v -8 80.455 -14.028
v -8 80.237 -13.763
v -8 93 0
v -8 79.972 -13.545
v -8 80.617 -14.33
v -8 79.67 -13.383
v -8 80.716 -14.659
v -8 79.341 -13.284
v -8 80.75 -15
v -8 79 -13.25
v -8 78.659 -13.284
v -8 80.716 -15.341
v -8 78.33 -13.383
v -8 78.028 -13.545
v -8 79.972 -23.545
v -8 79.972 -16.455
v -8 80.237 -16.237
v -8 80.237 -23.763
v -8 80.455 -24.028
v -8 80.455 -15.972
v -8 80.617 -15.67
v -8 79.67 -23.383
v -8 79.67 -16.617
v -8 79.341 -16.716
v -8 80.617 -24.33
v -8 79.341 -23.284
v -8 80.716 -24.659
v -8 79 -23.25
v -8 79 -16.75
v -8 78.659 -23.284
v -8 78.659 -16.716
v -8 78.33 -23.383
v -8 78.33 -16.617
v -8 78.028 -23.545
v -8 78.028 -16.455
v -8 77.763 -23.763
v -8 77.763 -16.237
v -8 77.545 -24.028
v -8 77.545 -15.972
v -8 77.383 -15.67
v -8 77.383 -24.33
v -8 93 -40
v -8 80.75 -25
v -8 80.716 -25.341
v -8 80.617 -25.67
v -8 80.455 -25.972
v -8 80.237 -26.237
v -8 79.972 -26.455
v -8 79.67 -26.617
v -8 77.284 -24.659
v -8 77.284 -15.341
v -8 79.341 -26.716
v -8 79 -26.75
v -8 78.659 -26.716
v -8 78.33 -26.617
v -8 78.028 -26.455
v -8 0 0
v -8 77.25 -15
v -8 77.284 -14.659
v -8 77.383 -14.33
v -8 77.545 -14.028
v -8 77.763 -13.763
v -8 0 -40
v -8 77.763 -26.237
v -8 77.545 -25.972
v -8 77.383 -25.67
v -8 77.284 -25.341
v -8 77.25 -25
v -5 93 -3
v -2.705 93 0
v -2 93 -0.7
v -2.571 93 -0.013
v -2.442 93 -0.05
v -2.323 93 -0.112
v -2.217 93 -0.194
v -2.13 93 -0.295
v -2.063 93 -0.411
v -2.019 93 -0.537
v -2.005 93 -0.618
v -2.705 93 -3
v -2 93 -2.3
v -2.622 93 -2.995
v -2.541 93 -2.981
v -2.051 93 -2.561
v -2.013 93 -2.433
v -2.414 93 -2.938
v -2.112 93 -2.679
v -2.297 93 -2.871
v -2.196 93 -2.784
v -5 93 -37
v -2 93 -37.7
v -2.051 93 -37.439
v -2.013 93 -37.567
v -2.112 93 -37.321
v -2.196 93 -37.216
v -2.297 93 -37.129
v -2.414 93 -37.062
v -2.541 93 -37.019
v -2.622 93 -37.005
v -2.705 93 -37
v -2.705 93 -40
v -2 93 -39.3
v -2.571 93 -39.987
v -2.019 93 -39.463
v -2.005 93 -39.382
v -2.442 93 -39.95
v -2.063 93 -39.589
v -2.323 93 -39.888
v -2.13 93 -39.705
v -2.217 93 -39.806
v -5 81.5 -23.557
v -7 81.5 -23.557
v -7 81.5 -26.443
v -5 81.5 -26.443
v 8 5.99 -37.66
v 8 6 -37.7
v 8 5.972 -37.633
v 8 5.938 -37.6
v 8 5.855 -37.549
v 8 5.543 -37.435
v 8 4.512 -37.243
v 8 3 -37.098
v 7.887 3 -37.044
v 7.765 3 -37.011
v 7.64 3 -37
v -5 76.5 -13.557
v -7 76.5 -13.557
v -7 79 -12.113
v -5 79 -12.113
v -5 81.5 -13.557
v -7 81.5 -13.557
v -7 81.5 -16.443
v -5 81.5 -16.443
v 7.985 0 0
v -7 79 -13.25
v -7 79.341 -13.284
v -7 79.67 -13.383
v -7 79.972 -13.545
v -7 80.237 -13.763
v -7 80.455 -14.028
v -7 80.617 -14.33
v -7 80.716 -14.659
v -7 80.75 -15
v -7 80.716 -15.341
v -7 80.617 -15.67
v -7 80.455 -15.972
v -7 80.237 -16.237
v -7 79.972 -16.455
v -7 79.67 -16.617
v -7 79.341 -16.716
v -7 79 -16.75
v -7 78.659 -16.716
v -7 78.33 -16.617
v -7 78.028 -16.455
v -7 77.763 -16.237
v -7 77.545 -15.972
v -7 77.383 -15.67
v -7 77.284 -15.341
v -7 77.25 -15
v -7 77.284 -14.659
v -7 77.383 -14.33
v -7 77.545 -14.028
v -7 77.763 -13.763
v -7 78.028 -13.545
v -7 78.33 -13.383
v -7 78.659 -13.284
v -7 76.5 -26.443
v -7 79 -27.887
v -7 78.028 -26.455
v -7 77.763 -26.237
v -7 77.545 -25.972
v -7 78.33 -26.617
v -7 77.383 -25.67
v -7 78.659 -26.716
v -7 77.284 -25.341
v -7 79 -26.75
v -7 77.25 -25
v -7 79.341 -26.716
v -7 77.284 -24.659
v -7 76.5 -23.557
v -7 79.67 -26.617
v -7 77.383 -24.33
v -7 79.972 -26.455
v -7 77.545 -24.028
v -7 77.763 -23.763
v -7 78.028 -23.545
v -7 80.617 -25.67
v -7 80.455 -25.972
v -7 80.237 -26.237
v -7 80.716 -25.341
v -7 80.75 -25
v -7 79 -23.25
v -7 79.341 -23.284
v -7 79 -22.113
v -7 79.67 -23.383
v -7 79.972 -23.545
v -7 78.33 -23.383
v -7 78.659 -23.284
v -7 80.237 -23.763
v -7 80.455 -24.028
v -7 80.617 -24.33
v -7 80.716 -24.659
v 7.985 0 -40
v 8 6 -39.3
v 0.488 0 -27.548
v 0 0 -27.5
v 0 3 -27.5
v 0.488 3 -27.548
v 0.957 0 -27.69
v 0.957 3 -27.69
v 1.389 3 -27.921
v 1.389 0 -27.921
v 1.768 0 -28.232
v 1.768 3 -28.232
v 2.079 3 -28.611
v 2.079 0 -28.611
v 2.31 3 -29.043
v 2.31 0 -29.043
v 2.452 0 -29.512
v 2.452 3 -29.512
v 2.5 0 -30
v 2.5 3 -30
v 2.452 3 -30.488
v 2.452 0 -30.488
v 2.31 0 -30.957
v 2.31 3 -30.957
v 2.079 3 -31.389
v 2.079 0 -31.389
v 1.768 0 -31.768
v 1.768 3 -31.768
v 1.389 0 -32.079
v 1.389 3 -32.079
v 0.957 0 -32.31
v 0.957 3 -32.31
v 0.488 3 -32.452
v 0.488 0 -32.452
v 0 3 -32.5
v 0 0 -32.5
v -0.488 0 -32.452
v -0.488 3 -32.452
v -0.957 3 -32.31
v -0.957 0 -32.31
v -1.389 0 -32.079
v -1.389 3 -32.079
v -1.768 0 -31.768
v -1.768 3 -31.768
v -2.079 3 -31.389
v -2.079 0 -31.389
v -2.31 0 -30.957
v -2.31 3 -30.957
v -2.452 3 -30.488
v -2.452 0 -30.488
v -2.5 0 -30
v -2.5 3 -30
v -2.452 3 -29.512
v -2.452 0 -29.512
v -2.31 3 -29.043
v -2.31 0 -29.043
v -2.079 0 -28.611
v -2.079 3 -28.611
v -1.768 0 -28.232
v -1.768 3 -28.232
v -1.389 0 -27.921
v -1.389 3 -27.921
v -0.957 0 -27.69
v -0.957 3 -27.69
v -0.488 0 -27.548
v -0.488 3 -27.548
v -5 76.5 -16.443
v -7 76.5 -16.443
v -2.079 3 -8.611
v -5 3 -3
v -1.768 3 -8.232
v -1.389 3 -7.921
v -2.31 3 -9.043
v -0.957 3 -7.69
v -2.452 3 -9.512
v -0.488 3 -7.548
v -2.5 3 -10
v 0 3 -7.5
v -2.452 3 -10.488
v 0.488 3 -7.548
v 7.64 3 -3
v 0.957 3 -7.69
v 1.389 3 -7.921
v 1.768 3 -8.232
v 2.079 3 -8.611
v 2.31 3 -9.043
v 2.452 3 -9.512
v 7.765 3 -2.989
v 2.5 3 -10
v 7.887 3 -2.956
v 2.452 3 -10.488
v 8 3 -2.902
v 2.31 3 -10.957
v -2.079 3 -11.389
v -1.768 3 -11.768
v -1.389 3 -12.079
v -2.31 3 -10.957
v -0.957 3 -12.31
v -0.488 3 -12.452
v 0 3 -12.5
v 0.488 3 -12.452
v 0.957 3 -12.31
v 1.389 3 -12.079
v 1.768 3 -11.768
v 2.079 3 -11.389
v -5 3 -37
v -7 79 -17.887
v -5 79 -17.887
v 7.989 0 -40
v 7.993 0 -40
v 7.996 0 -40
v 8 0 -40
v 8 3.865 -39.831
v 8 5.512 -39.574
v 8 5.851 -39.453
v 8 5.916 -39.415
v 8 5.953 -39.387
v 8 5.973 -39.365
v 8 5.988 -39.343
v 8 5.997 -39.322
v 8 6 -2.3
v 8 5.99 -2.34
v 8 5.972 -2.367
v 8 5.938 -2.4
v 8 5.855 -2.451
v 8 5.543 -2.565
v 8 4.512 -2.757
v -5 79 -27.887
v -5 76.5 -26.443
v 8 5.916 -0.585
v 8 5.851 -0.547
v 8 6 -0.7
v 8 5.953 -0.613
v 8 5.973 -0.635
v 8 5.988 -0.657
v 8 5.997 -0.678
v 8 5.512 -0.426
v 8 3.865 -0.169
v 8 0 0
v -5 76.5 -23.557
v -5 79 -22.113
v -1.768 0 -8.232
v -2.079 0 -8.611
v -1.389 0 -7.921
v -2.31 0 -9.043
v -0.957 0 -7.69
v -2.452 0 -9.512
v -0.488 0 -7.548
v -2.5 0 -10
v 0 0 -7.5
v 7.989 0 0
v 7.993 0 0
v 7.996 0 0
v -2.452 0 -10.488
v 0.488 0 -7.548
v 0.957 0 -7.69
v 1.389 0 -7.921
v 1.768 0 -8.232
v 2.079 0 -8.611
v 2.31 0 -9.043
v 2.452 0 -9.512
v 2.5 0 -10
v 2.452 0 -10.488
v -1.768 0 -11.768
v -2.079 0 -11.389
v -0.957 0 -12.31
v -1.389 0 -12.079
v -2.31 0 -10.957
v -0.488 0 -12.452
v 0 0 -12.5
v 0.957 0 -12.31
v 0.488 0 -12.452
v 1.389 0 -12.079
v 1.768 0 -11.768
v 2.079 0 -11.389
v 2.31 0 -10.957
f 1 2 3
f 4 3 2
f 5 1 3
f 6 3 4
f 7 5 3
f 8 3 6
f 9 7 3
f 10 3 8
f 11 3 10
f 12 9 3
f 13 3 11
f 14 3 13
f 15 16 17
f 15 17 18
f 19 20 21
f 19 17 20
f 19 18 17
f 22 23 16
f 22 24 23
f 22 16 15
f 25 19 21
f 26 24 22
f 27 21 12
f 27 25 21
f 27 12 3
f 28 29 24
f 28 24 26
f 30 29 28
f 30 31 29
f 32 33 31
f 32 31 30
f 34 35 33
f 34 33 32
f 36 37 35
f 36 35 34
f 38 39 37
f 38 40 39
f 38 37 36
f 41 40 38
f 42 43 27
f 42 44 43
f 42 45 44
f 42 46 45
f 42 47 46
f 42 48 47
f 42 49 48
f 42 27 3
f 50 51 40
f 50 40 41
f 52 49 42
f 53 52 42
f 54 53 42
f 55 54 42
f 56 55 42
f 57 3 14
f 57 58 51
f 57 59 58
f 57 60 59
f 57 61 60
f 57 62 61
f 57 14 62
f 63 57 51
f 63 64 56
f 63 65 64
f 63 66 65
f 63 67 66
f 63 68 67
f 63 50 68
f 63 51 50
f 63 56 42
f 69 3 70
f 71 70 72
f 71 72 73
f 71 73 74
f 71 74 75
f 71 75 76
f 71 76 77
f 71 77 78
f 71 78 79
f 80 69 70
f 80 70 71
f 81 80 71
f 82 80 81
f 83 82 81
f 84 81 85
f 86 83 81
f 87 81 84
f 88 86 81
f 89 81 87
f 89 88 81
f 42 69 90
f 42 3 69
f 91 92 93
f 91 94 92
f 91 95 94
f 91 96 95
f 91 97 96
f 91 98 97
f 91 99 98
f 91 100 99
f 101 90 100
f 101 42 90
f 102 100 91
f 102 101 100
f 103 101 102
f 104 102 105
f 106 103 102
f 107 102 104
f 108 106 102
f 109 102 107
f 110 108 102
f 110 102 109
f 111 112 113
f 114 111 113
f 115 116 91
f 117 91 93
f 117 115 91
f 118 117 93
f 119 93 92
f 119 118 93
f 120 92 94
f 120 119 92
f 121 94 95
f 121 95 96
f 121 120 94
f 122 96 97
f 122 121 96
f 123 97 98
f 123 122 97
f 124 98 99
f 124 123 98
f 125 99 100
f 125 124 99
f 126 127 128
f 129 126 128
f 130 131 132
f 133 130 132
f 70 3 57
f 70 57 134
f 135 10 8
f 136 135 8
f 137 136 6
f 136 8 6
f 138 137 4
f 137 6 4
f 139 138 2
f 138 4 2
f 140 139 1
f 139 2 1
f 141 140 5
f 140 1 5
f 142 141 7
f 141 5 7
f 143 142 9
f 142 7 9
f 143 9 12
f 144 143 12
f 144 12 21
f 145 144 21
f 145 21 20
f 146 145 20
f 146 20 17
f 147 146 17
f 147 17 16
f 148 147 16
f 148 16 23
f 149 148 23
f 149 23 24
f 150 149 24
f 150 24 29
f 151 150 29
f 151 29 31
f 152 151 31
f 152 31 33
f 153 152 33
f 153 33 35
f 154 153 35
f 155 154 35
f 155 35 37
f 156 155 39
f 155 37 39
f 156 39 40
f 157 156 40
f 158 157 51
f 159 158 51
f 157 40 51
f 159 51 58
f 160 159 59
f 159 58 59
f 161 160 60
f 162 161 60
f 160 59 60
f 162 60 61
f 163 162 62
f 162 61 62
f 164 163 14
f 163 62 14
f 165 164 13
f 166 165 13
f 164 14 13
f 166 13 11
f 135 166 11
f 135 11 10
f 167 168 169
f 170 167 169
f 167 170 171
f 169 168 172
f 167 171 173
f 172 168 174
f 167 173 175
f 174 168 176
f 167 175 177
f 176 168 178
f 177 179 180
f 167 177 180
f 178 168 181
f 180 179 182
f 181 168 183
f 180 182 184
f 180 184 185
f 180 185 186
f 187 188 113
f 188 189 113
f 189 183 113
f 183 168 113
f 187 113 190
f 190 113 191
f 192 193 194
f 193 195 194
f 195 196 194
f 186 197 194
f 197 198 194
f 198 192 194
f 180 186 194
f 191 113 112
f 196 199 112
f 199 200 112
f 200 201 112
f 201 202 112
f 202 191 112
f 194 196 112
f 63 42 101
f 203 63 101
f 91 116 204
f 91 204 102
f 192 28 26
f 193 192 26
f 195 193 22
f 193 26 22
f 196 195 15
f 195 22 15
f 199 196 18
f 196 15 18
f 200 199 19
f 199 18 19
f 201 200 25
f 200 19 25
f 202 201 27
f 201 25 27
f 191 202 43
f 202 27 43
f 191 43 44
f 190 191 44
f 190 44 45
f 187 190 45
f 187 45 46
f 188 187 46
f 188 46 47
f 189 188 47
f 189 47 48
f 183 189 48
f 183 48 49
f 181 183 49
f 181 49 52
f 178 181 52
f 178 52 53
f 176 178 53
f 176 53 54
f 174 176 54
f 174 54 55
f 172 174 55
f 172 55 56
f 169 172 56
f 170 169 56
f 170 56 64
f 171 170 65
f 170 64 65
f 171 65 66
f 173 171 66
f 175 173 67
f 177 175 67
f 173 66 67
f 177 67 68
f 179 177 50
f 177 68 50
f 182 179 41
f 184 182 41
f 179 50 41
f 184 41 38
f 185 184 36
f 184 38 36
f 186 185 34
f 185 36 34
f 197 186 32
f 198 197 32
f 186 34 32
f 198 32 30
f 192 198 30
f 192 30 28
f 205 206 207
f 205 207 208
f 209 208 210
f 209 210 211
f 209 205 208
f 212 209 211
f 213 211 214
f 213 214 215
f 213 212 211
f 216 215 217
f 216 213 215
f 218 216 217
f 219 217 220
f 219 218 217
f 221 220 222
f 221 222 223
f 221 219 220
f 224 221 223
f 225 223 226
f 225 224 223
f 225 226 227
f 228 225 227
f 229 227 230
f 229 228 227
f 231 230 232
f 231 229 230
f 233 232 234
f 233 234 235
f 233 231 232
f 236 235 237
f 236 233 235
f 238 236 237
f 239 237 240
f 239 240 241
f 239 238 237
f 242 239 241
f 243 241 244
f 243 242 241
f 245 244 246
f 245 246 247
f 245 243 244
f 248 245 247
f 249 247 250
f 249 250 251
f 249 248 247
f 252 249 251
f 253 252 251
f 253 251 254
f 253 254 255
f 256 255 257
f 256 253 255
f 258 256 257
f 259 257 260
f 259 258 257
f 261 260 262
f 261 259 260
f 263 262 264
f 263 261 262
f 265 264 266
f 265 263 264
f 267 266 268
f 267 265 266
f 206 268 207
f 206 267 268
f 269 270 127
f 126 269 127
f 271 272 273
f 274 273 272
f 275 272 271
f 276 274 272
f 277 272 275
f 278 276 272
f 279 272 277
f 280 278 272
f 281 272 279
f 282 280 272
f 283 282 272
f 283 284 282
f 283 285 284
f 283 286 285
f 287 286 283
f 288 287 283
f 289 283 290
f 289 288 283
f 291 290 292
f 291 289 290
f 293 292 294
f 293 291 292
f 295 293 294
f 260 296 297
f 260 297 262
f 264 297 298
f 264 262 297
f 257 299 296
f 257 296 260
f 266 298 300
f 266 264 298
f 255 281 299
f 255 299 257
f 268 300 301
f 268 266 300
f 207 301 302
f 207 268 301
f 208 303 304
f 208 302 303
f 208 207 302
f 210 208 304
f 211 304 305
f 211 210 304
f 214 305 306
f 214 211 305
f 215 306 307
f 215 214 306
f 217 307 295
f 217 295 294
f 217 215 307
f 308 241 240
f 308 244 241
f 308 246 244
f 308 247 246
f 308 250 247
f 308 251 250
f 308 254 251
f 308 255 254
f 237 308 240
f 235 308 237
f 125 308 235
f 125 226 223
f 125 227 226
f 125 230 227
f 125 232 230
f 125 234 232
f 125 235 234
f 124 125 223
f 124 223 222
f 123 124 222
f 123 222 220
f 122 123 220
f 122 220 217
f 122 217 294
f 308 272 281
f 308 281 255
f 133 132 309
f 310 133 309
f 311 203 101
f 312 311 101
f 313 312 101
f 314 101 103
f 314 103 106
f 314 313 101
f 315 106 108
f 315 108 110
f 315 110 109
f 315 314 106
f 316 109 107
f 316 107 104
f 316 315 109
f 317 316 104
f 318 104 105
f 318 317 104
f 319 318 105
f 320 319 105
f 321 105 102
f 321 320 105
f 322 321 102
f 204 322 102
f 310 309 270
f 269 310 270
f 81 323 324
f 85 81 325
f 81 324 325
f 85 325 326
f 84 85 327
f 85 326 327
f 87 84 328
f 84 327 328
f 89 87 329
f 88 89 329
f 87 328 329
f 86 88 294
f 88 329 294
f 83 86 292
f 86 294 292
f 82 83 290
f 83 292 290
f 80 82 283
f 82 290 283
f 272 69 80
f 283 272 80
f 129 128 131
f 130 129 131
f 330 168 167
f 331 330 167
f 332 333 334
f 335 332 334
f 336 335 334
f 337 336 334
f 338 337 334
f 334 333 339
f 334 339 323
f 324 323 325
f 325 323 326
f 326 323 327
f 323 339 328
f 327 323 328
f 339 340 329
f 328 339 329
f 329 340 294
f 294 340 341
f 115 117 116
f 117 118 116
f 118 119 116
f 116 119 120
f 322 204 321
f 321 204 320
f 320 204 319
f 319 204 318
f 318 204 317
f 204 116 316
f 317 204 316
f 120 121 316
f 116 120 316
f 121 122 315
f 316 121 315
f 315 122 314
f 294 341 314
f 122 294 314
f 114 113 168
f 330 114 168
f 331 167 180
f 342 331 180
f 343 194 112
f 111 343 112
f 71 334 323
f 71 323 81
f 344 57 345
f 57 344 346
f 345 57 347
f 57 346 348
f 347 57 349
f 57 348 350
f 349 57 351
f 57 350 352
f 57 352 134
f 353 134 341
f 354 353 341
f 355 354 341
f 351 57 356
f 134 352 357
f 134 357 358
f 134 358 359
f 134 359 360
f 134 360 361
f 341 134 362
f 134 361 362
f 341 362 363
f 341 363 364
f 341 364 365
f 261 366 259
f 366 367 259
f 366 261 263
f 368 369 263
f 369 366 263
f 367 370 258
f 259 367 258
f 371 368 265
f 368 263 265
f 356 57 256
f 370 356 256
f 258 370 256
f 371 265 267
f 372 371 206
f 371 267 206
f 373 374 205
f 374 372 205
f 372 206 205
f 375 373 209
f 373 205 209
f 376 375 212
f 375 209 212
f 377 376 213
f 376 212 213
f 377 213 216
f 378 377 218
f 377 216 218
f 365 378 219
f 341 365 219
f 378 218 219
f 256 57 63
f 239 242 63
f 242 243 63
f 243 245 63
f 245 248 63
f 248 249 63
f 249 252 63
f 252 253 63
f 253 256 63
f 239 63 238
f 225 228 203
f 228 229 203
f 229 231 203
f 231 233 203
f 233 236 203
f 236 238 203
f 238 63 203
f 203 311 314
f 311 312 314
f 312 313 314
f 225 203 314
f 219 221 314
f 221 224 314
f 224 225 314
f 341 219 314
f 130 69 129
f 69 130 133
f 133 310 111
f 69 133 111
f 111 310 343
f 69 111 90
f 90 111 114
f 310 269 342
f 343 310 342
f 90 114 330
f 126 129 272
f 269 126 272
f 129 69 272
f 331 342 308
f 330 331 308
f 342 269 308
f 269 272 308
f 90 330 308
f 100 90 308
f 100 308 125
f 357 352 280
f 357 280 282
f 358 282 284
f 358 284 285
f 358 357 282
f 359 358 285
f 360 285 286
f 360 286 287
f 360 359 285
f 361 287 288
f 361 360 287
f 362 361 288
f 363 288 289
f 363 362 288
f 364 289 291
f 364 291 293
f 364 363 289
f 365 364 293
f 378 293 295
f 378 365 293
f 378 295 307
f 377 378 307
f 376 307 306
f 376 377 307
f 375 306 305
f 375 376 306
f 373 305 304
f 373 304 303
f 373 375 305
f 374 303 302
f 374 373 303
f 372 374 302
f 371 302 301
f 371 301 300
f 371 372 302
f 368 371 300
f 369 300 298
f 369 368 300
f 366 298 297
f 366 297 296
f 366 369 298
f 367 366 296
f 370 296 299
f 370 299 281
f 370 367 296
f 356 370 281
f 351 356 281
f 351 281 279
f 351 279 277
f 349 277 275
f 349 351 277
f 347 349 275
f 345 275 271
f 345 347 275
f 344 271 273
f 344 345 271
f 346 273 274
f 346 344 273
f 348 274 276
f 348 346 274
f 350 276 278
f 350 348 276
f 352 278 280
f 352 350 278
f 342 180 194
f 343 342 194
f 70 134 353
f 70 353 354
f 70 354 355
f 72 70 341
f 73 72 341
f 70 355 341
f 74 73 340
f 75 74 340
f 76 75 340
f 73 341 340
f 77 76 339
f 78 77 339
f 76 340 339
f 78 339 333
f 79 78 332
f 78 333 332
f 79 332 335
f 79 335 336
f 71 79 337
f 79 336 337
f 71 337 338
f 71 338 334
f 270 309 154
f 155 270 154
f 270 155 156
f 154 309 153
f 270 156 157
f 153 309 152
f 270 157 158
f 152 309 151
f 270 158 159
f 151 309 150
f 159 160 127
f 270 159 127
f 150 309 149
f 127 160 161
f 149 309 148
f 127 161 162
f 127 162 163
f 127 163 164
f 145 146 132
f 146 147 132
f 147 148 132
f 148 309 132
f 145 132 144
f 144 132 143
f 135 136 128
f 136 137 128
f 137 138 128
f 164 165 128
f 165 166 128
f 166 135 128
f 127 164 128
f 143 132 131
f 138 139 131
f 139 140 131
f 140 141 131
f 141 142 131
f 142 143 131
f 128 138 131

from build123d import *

# Parameters (mm, degrees)
SKETCH1_W               = 16
SKETCH1_H               = 40
SKETCH1_R               = 2.5
BOSS_EXTRUDE1_DEPTH     = 3
BOSS_EXTRUDE3_START     = -3
SKETCH2_W               = 13
SKETCH2_H               = 3
SKETCH2_W_2             = 3
SKETCH2_H_2             = 34
BOSS_EXTRUDE3_DEPTH     = 93
CUT_EXTRUDE1_DEPTH      = 102.552941858
CUT_EXTRUDE1_DEPTH_BACK = 102.552941858
CUT_EXTRUDE2_START      = -1
SKETCH4_R               = 1.75
CUT_EXTRUDE2_DEPTH      = 102.493902258
SKETCH4_AGAIN_R         = 1.75
CUT_EXTRUDE3_DEPTH      = 103.493902258
FILLET1_R               = 0.7


with BuildPart() as part:
    # Sketch1 → Boss-Extrude1 (new body)
    with BuildSketch(Plane(origin=(0, 0, 0), x_dir=(1, 0, 0), z_dir=(0, 1, 0))):
        with Locations((0, 20)):
            Rectangle(SKETCH1_W, SKETCH1_H)
        with Locations(Location((0, 30, 0), (0, 0, 270))):
            Circle(SKETCH1_R, mode=Mode.SUBTRACT)
        with Locations(Location((0, 10, 0), (0, 0, 270))):
            Circle(SKETCH1_R, mode=Mode.SUBTRACT)
    extrude(amount=BOSS_EXTRUDE1_DEPTH)

    # Sketch2 → Boss-Extrude3 (add)
    with BuildSketch(Plane(origin=(0, 3, 0), x_dir=(1, 0, 0), z_dir=(0, 1, 0)).offset(BOSS_EXTRUDE3_START)):
        with Locations((1.5, 38.5)):
            Rectangle(SKETCH2_W, SKETCH2_H)
        with Locations((-6.5, 38.5)):
            Rectangle(SKETCH2_W_2, SKETCH2_H)
        with Locations((-6.5, 20)):
            Rectangle(SKETCH2_W_2, SKETCH2_H_2)
        with Locations((-6.5, 1.5)):
            Rectangle(SKETCH2_W_2, SKETCH2_H)
        with Locations((1.5, 1.5)):
            Rectangle(SKETCH2_W, SKETCH2_H)
    extrude(amount=BOSS_EXTRUDE3_DEPTH)

    # Sketch3 → Cut-Extrude1 (cut, two sides: drawn at the far end of the back side and taken through both)
    with BuildSketch(Plane(origin=(0, 0, -40), x_dir=(-1, 0, 0), z_dir=(0, 0, -1)).offset(-CUT_EXTRUDE1_DEPTH_BACK)):
        Polygon((-8, 6), (2, 93), (-8, 93), align=None)
    extrude(amount=CUT_EXTRUDE1_DEPTH + CUT_EXTRUDE1_DEPTH_BACK, mode=Mode.SUBTRACT)

    # Sketch4 → Cut-Extrude2 (cut, through all)
    # profile 1 of 2: a face of its own
    with BuildSketch(Plane.ZY.offset(8).offset(CUT_EXTRUDE2_START)):
        Polygon((-13.556624327, 76.5), (-12.113248654, 79), (-13.556624327, 81.5), (-16.443375673, 81.5), (-17.886751346, 79), (-16.443375673, 76.5), align=None)
        with Locations((-15, 79)):
            Circle(SKETCH4_R, mode=Mode.SUBTRACT)
    # profile 2 of 2: a face of its own
    with BuildSketch(Plane.ZY.offset(8).offset(CUT_EXTRUDE2_START)):
        Polygon((-23.556624327, 76.5), (-22.113248654, 79), (-23.556624327, 81.5), (-26.443375673, 81.5), (-27.886751346, 79), (-26.443375673, 76.5), align=None)
        with Locations((-25, 79)):
            Circle(SKETCH4_R, mode=Mode.SUBTRACT)
    extrude(amount=-CUT_EXTRUDE2_DEPTH, mode=Mode.SUBTRACT)

    # Sketch4 again → Cut-Extrude3 (cut, through all)
    with BuildSketch(Plane.ZY.offset(8)):
        with Locations((-25, 79)):
            Circle(SKETCH4_AGAIN_R)
        with Locations((-15, 79)):
            Circle(SKETCH4_AGAIN_R)
    extrude(amount=-CUT_EXTRUDE3_DEPTH, mode=Mode.SUBTRACT)

    # Fillet1
    fillet1_edges = [part.edges().sort_by_distance(p)[0] for p in [
        (3, 49.5, 0),
    ]]
    fillet(fillet1_edges, radius=FILLET1_R)
    fillet1_2_edges = [part.edges().sort_by_distance(p)[0] for p in [
        (3, 49.5, -3),
    ]]
    fillet(fillet1_2_edges, radius=FILLET1_R)
    fillet1_3_edges = [part.edges().sort_by_distance(p)[0] for p in [
        (3, 49.5, -40),
    ]]
    fillet(fillet1_3_edges, radius=FILLET1_R)
    fillet1_4_edges = [part.edges().sort_by_distance(p)[0] for p in [
        (3, 49.5, -37),
    ]]
    fillet(fillet1_4_edges, radius=FILLET1_R)


solid = part.part
